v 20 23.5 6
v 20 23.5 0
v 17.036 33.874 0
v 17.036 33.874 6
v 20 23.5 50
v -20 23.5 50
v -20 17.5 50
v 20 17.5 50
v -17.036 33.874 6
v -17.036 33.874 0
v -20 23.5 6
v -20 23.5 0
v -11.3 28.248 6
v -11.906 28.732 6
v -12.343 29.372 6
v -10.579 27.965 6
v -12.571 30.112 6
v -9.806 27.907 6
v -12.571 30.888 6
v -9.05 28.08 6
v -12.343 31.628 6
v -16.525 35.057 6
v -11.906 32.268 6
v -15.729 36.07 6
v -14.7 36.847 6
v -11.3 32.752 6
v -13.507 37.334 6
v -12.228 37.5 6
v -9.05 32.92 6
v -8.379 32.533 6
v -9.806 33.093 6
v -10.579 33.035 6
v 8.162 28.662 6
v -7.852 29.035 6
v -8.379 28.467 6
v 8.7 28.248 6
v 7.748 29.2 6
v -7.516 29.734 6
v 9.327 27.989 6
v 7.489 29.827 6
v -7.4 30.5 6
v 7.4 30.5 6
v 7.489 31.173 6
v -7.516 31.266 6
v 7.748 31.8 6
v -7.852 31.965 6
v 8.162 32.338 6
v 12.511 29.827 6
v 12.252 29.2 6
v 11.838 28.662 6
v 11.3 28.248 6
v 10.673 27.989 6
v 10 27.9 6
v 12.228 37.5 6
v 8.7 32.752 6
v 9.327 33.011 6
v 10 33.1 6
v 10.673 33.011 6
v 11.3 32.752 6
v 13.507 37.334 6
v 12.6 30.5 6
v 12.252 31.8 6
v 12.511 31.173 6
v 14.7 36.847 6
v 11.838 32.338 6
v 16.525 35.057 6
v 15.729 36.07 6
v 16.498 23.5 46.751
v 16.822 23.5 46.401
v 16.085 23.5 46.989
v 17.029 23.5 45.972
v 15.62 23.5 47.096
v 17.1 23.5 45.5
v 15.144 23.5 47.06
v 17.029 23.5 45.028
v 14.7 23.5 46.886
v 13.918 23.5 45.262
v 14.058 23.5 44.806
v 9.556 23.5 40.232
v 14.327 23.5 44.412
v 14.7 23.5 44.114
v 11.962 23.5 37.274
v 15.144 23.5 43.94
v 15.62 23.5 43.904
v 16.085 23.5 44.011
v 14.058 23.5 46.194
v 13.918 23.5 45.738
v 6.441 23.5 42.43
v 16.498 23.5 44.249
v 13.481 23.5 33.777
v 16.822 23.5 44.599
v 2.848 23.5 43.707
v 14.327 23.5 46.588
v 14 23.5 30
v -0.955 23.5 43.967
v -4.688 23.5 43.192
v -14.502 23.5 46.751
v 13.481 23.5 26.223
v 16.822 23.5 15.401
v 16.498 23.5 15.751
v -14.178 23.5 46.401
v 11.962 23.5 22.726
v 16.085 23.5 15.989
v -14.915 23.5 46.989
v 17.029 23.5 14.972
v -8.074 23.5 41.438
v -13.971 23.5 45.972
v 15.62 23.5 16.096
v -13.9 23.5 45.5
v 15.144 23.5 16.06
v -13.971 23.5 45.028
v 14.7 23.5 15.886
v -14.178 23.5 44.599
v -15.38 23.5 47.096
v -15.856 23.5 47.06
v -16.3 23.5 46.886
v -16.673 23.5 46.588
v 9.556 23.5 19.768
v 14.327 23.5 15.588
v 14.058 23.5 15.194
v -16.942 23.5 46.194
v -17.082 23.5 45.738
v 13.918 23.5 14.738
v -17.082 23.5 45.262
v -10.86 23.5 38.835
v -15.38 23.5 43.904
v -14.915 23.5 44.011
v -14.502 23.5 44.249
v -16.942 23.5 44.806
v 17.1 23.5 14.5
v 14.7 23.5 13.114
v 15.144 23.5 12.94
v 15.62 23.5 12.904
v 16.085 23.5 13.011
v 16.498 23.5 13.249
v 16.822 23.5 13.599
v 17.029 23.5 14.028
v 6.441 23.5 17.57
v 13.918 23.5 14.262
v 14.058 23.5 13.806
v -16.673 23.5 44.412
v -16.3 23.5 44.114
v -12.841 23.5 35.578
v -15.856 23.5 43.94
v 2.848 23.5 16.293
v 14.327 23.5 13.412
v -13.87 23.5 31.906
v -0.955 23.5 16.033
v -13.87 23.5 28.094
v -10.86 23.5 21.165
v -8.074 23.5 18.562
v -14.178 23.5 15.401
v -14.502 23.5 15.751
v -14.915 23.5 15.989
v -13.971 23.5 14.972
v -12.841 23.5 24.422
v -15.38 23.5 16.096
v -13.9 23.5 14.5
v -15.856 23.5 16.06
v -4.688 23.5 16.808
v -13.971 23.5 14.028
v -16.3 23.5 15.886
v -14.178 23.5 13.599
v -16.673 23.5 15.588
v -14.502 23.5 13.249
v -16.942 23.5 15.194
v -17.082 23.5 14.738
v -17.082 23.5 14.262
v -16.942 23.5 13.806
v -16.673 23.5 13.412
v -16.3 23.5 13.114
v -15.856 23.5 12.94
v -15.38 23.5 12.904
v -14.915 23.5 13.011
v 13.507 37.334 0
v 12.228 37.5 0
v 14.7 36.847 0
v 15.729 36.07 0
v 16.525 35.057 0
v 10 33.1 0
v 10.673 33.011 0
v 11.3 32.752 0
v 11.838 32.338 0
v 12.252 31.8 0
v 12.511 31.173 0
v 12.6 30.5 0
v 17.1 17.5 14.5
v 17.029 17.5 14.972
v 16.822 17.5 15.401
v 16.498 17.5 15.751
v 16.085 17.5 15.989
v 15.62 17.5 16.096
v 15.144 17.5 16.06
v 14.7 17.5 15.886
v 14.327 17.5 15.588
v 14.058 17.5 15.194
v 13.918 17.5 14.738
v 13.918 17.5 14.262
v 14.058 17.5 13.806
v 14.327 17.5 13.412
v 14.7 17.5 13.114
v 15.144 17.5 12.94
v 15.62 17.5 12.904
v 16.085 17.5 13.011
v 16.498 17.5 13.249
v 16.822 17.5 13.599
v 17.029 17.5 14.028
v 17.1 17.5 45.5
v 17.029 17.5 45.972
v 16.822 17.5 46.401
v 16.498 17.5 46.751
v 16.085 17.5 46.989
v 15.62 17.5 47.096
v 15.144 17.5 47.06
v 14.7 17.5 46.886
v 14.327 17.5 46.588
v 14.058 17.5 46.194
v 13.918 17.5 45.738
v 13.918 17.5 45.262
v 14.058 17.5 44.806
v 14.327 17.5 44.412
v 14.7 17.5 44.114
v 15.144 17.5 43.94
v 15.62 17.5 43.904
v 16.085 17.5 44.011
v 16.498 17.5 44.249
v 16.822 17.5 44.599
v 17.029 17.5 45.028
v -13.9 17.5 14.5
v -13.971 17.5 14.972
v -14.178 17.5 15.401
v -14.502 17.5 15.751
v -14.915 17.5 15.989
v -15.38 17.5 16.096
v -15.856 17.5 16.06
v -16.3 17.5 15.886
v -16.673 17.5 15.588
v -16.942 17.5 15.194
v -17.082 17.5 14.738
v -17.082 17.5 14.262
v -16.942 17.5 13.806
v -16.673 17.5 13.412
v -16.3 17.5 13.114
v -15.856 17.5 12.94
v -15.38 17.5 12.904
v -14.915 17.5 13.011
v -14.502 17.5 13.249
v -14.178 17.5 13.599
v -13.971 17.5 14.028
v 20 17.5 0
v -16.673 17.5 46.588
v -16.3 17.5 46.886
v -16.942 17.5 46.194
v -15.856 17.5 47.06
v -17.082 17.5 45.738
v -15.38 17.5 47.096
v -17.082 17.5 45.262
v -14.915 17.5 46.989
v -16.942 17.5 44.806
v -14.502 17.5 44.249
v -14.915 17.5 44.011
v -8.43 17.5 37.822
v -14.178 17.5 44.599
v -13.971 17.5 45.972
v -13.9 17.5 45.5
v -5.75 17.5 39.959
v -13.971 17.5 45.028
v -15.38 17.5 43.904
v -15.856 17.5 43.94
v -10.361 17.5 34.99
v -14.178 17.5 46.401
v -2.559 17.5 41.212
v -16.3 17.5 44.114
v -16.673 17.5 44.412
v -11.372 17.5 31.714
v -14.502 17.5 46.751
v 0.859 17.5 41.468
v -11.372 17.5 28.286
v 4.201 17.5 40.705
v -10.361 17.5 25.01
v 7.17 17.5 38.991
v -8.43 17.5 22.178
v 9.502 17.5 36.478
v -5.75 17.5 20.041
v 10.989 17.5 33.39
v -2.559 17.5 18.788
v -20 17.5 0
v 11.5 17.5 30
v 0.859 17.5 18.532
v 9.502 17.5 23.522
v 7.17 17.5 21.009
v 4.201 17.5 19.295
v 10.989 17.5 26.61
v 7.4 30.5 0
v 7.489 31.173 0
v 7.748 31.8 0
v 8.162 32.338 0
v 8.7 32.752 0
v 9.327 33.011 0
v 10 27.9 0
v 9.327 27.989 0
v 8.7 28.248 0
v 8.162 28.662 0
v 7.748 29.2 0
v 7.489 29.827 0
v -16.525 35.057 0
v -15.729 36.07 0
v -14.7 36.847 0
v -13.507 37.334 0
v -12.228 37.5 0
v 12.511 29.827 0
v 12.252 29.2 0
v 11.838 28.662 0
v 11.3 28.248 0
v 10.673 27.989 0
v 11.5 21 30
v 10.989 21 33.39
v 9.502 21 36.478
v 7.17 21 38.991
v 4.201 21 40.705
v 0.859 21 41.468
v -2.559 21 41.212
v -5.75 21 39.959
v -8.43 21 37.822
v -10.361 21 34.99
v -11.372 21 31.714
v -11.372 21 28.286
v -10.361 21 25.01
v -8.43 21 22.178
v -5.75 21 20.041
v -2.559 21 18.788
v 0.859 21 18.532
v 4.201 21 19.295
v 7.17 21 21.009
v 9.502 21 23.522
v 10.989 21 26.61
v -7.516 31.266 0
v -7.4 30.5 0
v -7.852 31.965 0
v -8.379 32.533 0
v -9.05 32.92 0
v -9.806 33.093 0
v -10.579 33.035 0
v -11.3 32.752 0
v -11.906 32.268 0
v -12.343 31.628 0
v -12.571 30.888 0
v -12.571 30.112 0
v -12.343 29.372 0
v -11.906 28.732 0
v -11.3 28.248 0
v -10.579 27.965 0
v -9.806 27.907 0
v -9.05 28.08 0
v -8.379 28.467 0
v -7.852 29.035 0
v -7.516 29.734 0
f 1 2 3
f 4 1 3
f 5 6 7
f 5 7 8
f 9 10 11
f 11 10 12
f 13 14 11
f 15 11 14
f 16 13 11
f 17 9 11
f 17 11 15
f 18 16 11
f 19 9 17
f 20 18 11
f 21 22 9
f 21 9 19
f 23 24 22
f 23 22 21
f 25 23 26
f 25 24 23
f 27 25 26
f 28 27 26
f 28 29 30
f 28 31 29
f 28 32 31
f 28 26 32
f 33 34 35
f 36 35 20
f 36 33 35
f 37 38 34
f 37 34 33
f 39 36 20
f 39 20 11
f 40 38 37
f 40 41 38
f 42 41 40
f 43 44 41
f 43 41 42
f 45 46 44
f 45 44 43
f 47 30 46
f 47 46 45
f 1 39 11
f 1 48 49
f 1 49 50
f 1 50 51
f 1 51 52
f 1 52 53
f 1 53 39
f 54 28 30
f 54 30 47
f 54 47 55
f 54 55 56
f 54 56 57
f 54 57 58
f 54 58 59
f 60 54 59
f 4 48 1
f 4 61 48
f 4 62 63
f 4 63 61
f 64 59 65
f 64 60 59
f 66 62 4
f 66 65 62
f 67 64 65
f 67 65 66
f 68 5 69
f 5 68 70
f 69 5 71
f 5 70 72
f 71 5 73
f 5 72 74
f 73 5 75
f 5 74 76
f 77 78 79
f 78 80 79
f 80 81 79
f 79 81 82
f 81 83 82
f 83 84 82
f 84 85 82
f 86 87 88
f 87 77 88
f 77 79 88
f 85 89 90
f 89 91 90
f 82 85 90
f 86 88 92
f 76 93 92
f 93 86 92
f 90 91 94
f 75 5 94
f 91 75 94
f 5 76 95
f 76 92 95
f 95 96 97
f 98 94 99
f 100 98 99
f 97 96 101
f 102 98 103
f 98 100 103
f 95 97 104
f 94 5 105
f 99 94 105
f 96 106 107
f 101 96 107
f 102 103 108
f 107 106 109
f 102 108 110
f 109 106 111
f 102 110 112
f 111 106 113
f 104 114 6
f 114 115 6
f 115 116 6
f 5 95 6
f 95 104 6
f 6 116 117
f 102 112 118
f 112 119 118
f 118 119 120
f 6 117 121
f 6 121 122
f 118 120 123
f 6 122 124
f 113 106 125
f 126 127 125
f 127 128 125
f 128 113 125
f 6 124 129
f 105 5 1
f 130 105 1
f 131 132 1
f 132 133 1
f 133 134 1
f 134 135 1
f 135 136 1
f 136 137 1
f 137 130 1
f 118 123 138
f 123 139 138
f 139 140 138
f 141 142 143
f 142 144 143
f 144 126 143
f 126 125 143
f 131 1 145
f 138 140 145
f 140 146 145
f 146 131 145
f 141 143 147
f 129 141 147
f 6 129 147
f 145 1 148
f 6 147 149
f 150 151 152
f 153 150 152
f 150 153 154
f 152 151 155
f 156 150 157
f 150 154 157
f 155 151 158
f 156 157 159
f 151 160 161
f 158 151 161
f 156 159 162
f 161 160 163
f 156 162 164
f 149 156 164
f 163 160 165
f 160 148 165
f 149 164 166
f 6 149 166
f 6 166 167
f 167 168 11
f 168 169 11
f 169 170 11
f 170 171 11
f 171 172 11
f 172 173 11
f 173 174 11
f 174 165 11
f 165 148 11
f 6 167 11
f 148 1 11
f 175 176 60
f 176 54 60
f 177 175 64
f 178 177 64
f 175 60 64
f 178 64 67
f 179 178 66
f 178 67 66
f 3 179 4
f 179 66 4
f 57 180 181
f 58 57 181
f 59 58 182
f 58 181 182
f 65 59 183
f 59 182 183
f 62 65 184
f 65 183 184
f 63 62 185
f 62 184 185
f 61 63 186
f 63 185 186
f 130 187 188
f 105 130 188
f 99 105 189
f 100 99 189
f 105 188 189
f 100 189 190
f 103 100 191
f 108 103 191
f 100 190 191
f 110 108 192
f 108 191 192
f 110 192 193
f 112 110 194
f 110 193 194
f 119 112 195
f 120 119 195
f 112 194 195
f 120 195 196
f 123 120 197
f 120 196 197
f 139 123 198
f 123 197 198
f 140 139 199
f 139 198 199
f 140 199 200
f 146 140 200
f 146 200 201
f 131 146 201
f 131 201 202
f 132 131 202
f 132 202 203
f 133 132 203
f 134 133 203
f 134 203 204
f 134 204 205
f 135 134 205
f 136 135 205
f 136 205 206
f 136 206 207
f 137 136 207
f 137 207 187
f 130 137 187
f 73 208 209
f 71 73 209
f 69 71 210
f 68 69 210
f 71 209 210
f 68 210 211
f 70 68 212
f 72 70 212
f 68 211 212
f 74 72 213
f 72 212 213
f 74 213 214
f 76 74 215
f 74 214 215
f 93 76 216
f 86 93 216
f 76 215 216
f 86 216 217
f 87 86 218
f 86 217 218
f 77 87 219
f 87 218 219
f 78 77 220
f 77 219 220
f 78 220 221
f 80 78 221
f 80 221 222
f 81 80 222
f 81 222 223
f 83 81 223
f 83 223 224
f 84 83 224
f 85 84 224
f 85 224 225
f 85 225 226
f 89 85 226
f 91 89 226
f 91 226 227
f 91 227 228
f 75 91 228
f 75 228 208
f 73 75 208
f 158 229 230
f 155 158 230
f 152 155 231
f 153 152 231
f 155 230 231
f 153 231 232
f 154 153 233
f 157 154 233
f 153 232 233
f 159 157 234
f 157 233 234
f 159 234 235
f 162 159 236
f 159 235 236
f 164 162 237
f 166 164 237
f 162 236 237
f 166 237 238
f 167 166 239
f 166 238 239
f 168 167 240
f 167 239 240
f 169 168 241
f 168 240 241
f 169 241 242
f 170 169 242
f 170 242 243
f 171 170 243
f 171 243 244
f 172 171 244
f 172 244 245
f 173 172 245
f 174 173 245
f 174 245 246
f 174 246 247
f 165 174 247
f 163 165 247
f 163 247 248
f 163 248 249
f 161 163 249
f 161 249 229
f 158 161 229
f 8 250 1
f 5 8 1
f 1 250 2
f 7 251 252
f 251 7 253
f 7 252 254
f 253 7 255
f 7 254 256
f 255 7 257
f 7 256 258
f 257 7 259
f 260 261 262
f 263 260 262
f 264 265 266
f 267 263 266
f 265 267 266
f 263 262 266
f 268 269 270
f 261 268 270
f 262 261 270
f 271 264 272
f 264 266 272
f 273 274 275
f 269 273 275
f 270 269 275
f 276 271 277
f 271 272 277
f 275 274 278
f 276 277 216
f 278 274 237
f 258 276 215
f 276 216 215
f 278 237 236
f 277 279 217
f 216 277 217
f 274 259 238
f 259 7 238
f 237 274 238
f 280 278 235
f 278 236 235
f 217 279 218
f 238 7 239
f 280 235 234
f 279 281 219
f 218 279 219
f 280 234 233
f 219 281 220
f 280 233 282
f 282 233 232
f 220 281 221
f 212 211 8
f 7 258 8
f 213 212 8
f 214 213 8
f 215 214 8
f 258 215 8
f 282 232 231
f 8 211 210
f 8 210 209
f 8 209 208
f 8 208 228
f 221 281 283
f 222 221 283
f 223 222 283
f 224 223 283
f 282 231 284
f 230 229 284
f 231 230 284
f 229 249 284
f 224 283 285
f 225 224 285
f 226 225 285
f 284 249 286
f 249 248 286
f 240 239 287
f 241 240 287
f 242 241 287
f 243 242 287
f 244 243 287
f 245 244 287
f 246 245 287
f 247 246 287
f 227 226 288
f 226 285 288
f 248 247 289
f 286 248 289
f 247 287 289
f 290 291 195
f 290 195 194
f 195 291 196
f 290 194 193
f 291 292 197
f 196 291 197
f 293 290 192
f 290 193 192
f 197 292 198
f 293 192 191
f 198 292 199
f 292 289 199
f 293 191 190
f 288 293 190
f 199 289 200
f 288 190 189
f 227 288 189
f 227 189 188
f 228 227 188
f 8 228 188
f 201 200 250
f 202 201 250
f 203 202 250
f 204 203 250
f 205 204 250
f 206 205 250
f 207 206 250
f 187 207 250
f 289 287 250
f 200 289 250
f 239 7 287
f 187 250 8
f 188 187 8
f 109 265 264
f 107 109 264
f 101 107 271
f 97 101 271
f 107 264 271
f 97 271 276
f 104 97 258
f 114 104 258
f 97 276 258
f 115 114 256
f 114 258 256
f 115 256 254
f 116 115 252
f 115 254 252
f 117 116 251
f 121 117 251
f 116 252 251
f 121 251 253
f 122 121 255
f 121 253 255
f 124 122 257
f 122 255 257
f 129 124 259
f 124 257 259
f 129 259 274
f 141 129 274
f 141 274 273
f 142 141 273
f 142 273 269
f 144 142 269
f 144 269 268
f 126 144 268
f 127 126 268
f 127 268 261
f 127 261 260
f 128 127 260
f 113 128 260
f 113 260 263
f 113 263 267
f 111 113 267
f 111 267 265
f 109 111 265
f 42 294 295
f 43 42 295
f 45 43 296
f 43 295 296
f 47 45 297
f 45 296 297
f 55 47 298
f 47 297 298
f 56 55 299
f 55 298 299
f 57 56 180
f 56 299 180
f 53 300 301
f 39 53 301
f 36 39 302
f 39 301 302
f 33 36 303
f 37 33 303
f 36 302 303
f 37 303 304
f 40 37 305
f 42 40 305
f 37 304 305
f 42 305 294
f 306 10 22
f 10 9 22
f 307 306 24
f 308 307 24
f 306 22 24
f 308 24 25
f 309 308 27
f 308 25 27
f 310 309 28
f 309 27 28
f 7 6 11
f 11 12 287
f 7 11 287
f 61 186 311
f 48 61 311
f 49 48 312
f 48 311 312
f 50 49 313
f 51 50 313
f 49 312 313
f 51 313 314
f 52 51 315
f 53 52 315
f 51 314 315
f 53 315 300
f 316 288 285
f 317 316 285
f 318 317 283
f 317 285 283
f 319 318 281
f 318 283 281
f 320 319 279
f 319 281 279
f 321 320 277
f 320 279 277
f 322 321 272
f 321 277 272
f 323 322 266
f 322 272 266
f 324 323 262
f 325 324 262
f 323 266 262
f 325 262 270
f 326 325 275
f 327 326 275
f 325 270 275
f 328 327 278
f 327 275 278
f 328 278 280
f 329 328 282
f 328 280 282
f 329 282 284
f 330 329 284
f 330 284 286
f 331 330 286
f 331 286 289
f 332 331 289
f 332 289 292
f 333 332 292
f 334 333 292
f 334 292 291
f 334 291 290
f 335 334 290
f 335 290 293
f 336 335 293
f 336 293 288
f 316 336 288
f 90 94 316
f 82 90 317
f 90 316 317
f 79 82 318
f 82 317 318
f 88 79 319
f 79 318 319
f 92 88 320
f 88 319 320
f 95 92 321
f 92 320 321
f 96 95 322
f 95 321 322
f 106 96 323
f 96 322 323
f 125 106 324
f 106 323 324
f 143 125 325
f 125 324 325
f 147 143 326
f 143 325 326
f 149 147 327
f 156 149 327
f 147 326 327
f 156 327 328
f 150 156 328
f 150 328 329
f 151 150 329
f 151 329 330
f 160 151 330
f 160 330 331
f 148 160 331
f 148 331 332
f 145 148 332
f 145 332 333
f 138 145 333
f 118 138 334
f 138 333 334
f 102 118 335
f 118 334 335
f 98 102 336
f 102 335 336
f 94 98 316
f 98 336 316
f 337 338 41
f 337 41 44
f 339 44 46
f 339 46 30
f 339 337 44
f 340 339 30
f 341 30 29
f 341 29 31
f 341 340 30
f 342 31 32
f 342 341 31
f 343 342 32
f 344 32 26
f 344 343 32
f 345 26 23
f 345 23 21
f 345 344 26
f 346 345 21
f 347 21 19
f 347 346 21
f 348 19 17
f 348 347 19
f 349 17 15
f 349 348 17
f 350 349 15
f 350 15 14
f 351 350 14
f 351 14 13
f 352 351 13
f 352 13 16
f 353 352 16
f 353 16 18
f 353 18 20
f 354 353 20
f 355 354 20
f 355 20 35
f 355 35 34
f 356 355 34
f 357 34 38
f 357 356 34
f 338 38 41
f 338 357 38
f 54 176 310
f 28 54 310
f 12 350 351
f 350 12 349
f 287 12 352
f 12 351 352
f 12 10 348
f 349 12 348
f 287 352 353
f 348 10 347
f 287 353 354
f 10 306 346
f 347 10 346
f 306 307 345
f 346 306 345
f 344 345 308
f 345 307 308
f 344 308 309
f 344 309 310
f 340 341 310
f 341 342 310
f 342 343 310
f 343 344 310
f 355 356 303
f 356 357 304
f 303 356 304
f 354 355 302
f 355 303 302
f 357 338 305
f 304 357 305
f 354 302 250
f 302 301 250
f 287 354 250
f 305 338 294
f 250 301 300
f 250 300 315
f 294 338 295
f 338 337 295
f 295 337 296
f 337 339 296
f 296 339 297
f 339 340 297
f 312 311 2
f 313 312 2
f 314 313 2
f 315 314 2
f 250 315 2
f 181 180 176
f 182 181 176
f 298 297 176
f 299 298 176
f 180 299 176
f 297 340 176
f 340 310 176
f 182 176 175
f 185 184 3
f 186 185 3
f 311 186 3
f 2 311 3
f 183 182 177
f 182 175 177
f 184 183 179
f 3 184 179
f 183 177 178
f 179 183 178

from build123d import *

# Parameters (mm, degrees)
F1_W     = 12
F1_H     = 14
F1_R     = 2.6
F2_DEPTH = 6
F3_DEPTH = 50
F4_R     = 11.5
F4_R_2   = 1.6
F5_DEPTH = 20.001
F7_R     = 5
F8_SIZE  = 2.5


with BuildPart() as f2:
    # F1 (on Top) → F2 (new body)
    with BuildSketch(Plane.XY):
        with Locations((-10, 30.4999971617)):
            Rectangle(F1_W, F1_H)
        with Locations((-10, 30.4999971617)):
            Circle(F1_R, mode=Mode.SUBTRACT)
        with BuildLine():
            Line((10, 33.0999971617), (10, 37.4999971617))
            Line((10, 37.4999971617), (4, 37.4999971617))
            Line((4, 37.4999971617), (4, 30.4999971617))
            Line((4, 30.4999971617), (7.4, 30.4999971617))
            ThreePointArc((7.4, 30.4999971617), (8.1615223689, 32.3384747928), (10, 33.0999971617))
        make_face()
        with BuildLine():
            Line((16, 30.4999971617), (16, 37.4999971617))
            Line((16, 37.4999971617), (10, 37.4999971617))
            Line((10, 37.4999971617), (10, 33.0999971617))
            ThreePointArc((10, 33.0999971617), (11.8384776311, 32.3384747928), (12.6, 30.4999971617))
            Line((12.6, 30.4999971617), (16, 30.4999971617))
        make_face()
        with BuildLine():
            Line((10, 23.4999971617), (16, 23.4999971617))
            Line((16, 23.4999971617), (16, 30.4999971617))
            Line((16, 30.4999971617), (12.6, 30.4999971617))
            ThreePointArc((12.6, 30.4999971617), (11.8384776311, 28.6615195306), (10, 27.8999971617))
            Line((10, 27.8999971617), (10, 23.4999971617))
        make_face()
        with BuildLine():
            Line((4, 23.4999971617), (10, 23.4999971617))
            Line((10, 23.4999971617), (10, 27.8999971617))
            ThreePointArc((10, 27.8999971617), (8.1615223689, 28.6615195306), (7.4, 30.4999971617))
            Line((7.4, 30.4999971617), (4, 30.4999971617))
            Line((4, 30.4999971617), (4, 23.4999971617))
        make_face()
        Polygon((-16, 37.4999971617), (-20, 23.4999971617), (-16, 23.4999971617), align=None)
        Polygon((-4, 37.4999971617), (-4, 23.4999971617), (4, 23.4999971617), (4, 30.4999971617), (4, 37.4999971617), align=None)
        Polygon((16, 23.4999971617), (20, 23.4999971617), (16, 37.4999971617), (16, 30.4999971617), align=None)
    extrude(amount=F2_DEPTH)

    # F1 (on Top) → F3 (join)
    with BuildSketch(Plane.XY):
        Polygon((-20, 23.4999971617), (-20, 17.4999971617), (20, 17.4999971617), (20, 23.4999971617), (16, 23.4999971617), (10, 23.4999971617), (4, 23.4999971617), (-4, 23.4999971617), (-16, 23.4999971617), align=None)
    extrude(amount=F3_DEPTH)

    # F4 (on face) → F5 (cut, through all)
    with BuildSketch(Plane.XZ.offset(-17.4999971617)):
        with Locations((0, 30)):
            Circle(F4_R)
        with Locations((-15.5, 45.5)):
            Circle(F4_R_2)
        with Locations((-15.5, 14.5)):
            Circle(F4_R_2)
        with Locations((15.5, 14.5)):
            Circle(F4_R_2)
        with Locations((15.5, 45.5)):
            Circle(F4_R_2)
    extrude(amount=-F5_DEPTH, mode=Mode.SUBTRACT)

    # F7
    f7_edges = [f2.edges().sort_by_distance(p)[0] for p in [
        (16, 37.499997, 3),
        (-16, 37.499997, 3),
    ]]
    fillet(f7_edges, radius=F7_R)

    # F8
    f8_edges = [f2.edges().sort_by_distance(p)[0] for p in [
        (-11.5, 23.499997, 30),
    ]]
    chamfer(f8_edges, length=F8_SIZE)


solid = f2.part
